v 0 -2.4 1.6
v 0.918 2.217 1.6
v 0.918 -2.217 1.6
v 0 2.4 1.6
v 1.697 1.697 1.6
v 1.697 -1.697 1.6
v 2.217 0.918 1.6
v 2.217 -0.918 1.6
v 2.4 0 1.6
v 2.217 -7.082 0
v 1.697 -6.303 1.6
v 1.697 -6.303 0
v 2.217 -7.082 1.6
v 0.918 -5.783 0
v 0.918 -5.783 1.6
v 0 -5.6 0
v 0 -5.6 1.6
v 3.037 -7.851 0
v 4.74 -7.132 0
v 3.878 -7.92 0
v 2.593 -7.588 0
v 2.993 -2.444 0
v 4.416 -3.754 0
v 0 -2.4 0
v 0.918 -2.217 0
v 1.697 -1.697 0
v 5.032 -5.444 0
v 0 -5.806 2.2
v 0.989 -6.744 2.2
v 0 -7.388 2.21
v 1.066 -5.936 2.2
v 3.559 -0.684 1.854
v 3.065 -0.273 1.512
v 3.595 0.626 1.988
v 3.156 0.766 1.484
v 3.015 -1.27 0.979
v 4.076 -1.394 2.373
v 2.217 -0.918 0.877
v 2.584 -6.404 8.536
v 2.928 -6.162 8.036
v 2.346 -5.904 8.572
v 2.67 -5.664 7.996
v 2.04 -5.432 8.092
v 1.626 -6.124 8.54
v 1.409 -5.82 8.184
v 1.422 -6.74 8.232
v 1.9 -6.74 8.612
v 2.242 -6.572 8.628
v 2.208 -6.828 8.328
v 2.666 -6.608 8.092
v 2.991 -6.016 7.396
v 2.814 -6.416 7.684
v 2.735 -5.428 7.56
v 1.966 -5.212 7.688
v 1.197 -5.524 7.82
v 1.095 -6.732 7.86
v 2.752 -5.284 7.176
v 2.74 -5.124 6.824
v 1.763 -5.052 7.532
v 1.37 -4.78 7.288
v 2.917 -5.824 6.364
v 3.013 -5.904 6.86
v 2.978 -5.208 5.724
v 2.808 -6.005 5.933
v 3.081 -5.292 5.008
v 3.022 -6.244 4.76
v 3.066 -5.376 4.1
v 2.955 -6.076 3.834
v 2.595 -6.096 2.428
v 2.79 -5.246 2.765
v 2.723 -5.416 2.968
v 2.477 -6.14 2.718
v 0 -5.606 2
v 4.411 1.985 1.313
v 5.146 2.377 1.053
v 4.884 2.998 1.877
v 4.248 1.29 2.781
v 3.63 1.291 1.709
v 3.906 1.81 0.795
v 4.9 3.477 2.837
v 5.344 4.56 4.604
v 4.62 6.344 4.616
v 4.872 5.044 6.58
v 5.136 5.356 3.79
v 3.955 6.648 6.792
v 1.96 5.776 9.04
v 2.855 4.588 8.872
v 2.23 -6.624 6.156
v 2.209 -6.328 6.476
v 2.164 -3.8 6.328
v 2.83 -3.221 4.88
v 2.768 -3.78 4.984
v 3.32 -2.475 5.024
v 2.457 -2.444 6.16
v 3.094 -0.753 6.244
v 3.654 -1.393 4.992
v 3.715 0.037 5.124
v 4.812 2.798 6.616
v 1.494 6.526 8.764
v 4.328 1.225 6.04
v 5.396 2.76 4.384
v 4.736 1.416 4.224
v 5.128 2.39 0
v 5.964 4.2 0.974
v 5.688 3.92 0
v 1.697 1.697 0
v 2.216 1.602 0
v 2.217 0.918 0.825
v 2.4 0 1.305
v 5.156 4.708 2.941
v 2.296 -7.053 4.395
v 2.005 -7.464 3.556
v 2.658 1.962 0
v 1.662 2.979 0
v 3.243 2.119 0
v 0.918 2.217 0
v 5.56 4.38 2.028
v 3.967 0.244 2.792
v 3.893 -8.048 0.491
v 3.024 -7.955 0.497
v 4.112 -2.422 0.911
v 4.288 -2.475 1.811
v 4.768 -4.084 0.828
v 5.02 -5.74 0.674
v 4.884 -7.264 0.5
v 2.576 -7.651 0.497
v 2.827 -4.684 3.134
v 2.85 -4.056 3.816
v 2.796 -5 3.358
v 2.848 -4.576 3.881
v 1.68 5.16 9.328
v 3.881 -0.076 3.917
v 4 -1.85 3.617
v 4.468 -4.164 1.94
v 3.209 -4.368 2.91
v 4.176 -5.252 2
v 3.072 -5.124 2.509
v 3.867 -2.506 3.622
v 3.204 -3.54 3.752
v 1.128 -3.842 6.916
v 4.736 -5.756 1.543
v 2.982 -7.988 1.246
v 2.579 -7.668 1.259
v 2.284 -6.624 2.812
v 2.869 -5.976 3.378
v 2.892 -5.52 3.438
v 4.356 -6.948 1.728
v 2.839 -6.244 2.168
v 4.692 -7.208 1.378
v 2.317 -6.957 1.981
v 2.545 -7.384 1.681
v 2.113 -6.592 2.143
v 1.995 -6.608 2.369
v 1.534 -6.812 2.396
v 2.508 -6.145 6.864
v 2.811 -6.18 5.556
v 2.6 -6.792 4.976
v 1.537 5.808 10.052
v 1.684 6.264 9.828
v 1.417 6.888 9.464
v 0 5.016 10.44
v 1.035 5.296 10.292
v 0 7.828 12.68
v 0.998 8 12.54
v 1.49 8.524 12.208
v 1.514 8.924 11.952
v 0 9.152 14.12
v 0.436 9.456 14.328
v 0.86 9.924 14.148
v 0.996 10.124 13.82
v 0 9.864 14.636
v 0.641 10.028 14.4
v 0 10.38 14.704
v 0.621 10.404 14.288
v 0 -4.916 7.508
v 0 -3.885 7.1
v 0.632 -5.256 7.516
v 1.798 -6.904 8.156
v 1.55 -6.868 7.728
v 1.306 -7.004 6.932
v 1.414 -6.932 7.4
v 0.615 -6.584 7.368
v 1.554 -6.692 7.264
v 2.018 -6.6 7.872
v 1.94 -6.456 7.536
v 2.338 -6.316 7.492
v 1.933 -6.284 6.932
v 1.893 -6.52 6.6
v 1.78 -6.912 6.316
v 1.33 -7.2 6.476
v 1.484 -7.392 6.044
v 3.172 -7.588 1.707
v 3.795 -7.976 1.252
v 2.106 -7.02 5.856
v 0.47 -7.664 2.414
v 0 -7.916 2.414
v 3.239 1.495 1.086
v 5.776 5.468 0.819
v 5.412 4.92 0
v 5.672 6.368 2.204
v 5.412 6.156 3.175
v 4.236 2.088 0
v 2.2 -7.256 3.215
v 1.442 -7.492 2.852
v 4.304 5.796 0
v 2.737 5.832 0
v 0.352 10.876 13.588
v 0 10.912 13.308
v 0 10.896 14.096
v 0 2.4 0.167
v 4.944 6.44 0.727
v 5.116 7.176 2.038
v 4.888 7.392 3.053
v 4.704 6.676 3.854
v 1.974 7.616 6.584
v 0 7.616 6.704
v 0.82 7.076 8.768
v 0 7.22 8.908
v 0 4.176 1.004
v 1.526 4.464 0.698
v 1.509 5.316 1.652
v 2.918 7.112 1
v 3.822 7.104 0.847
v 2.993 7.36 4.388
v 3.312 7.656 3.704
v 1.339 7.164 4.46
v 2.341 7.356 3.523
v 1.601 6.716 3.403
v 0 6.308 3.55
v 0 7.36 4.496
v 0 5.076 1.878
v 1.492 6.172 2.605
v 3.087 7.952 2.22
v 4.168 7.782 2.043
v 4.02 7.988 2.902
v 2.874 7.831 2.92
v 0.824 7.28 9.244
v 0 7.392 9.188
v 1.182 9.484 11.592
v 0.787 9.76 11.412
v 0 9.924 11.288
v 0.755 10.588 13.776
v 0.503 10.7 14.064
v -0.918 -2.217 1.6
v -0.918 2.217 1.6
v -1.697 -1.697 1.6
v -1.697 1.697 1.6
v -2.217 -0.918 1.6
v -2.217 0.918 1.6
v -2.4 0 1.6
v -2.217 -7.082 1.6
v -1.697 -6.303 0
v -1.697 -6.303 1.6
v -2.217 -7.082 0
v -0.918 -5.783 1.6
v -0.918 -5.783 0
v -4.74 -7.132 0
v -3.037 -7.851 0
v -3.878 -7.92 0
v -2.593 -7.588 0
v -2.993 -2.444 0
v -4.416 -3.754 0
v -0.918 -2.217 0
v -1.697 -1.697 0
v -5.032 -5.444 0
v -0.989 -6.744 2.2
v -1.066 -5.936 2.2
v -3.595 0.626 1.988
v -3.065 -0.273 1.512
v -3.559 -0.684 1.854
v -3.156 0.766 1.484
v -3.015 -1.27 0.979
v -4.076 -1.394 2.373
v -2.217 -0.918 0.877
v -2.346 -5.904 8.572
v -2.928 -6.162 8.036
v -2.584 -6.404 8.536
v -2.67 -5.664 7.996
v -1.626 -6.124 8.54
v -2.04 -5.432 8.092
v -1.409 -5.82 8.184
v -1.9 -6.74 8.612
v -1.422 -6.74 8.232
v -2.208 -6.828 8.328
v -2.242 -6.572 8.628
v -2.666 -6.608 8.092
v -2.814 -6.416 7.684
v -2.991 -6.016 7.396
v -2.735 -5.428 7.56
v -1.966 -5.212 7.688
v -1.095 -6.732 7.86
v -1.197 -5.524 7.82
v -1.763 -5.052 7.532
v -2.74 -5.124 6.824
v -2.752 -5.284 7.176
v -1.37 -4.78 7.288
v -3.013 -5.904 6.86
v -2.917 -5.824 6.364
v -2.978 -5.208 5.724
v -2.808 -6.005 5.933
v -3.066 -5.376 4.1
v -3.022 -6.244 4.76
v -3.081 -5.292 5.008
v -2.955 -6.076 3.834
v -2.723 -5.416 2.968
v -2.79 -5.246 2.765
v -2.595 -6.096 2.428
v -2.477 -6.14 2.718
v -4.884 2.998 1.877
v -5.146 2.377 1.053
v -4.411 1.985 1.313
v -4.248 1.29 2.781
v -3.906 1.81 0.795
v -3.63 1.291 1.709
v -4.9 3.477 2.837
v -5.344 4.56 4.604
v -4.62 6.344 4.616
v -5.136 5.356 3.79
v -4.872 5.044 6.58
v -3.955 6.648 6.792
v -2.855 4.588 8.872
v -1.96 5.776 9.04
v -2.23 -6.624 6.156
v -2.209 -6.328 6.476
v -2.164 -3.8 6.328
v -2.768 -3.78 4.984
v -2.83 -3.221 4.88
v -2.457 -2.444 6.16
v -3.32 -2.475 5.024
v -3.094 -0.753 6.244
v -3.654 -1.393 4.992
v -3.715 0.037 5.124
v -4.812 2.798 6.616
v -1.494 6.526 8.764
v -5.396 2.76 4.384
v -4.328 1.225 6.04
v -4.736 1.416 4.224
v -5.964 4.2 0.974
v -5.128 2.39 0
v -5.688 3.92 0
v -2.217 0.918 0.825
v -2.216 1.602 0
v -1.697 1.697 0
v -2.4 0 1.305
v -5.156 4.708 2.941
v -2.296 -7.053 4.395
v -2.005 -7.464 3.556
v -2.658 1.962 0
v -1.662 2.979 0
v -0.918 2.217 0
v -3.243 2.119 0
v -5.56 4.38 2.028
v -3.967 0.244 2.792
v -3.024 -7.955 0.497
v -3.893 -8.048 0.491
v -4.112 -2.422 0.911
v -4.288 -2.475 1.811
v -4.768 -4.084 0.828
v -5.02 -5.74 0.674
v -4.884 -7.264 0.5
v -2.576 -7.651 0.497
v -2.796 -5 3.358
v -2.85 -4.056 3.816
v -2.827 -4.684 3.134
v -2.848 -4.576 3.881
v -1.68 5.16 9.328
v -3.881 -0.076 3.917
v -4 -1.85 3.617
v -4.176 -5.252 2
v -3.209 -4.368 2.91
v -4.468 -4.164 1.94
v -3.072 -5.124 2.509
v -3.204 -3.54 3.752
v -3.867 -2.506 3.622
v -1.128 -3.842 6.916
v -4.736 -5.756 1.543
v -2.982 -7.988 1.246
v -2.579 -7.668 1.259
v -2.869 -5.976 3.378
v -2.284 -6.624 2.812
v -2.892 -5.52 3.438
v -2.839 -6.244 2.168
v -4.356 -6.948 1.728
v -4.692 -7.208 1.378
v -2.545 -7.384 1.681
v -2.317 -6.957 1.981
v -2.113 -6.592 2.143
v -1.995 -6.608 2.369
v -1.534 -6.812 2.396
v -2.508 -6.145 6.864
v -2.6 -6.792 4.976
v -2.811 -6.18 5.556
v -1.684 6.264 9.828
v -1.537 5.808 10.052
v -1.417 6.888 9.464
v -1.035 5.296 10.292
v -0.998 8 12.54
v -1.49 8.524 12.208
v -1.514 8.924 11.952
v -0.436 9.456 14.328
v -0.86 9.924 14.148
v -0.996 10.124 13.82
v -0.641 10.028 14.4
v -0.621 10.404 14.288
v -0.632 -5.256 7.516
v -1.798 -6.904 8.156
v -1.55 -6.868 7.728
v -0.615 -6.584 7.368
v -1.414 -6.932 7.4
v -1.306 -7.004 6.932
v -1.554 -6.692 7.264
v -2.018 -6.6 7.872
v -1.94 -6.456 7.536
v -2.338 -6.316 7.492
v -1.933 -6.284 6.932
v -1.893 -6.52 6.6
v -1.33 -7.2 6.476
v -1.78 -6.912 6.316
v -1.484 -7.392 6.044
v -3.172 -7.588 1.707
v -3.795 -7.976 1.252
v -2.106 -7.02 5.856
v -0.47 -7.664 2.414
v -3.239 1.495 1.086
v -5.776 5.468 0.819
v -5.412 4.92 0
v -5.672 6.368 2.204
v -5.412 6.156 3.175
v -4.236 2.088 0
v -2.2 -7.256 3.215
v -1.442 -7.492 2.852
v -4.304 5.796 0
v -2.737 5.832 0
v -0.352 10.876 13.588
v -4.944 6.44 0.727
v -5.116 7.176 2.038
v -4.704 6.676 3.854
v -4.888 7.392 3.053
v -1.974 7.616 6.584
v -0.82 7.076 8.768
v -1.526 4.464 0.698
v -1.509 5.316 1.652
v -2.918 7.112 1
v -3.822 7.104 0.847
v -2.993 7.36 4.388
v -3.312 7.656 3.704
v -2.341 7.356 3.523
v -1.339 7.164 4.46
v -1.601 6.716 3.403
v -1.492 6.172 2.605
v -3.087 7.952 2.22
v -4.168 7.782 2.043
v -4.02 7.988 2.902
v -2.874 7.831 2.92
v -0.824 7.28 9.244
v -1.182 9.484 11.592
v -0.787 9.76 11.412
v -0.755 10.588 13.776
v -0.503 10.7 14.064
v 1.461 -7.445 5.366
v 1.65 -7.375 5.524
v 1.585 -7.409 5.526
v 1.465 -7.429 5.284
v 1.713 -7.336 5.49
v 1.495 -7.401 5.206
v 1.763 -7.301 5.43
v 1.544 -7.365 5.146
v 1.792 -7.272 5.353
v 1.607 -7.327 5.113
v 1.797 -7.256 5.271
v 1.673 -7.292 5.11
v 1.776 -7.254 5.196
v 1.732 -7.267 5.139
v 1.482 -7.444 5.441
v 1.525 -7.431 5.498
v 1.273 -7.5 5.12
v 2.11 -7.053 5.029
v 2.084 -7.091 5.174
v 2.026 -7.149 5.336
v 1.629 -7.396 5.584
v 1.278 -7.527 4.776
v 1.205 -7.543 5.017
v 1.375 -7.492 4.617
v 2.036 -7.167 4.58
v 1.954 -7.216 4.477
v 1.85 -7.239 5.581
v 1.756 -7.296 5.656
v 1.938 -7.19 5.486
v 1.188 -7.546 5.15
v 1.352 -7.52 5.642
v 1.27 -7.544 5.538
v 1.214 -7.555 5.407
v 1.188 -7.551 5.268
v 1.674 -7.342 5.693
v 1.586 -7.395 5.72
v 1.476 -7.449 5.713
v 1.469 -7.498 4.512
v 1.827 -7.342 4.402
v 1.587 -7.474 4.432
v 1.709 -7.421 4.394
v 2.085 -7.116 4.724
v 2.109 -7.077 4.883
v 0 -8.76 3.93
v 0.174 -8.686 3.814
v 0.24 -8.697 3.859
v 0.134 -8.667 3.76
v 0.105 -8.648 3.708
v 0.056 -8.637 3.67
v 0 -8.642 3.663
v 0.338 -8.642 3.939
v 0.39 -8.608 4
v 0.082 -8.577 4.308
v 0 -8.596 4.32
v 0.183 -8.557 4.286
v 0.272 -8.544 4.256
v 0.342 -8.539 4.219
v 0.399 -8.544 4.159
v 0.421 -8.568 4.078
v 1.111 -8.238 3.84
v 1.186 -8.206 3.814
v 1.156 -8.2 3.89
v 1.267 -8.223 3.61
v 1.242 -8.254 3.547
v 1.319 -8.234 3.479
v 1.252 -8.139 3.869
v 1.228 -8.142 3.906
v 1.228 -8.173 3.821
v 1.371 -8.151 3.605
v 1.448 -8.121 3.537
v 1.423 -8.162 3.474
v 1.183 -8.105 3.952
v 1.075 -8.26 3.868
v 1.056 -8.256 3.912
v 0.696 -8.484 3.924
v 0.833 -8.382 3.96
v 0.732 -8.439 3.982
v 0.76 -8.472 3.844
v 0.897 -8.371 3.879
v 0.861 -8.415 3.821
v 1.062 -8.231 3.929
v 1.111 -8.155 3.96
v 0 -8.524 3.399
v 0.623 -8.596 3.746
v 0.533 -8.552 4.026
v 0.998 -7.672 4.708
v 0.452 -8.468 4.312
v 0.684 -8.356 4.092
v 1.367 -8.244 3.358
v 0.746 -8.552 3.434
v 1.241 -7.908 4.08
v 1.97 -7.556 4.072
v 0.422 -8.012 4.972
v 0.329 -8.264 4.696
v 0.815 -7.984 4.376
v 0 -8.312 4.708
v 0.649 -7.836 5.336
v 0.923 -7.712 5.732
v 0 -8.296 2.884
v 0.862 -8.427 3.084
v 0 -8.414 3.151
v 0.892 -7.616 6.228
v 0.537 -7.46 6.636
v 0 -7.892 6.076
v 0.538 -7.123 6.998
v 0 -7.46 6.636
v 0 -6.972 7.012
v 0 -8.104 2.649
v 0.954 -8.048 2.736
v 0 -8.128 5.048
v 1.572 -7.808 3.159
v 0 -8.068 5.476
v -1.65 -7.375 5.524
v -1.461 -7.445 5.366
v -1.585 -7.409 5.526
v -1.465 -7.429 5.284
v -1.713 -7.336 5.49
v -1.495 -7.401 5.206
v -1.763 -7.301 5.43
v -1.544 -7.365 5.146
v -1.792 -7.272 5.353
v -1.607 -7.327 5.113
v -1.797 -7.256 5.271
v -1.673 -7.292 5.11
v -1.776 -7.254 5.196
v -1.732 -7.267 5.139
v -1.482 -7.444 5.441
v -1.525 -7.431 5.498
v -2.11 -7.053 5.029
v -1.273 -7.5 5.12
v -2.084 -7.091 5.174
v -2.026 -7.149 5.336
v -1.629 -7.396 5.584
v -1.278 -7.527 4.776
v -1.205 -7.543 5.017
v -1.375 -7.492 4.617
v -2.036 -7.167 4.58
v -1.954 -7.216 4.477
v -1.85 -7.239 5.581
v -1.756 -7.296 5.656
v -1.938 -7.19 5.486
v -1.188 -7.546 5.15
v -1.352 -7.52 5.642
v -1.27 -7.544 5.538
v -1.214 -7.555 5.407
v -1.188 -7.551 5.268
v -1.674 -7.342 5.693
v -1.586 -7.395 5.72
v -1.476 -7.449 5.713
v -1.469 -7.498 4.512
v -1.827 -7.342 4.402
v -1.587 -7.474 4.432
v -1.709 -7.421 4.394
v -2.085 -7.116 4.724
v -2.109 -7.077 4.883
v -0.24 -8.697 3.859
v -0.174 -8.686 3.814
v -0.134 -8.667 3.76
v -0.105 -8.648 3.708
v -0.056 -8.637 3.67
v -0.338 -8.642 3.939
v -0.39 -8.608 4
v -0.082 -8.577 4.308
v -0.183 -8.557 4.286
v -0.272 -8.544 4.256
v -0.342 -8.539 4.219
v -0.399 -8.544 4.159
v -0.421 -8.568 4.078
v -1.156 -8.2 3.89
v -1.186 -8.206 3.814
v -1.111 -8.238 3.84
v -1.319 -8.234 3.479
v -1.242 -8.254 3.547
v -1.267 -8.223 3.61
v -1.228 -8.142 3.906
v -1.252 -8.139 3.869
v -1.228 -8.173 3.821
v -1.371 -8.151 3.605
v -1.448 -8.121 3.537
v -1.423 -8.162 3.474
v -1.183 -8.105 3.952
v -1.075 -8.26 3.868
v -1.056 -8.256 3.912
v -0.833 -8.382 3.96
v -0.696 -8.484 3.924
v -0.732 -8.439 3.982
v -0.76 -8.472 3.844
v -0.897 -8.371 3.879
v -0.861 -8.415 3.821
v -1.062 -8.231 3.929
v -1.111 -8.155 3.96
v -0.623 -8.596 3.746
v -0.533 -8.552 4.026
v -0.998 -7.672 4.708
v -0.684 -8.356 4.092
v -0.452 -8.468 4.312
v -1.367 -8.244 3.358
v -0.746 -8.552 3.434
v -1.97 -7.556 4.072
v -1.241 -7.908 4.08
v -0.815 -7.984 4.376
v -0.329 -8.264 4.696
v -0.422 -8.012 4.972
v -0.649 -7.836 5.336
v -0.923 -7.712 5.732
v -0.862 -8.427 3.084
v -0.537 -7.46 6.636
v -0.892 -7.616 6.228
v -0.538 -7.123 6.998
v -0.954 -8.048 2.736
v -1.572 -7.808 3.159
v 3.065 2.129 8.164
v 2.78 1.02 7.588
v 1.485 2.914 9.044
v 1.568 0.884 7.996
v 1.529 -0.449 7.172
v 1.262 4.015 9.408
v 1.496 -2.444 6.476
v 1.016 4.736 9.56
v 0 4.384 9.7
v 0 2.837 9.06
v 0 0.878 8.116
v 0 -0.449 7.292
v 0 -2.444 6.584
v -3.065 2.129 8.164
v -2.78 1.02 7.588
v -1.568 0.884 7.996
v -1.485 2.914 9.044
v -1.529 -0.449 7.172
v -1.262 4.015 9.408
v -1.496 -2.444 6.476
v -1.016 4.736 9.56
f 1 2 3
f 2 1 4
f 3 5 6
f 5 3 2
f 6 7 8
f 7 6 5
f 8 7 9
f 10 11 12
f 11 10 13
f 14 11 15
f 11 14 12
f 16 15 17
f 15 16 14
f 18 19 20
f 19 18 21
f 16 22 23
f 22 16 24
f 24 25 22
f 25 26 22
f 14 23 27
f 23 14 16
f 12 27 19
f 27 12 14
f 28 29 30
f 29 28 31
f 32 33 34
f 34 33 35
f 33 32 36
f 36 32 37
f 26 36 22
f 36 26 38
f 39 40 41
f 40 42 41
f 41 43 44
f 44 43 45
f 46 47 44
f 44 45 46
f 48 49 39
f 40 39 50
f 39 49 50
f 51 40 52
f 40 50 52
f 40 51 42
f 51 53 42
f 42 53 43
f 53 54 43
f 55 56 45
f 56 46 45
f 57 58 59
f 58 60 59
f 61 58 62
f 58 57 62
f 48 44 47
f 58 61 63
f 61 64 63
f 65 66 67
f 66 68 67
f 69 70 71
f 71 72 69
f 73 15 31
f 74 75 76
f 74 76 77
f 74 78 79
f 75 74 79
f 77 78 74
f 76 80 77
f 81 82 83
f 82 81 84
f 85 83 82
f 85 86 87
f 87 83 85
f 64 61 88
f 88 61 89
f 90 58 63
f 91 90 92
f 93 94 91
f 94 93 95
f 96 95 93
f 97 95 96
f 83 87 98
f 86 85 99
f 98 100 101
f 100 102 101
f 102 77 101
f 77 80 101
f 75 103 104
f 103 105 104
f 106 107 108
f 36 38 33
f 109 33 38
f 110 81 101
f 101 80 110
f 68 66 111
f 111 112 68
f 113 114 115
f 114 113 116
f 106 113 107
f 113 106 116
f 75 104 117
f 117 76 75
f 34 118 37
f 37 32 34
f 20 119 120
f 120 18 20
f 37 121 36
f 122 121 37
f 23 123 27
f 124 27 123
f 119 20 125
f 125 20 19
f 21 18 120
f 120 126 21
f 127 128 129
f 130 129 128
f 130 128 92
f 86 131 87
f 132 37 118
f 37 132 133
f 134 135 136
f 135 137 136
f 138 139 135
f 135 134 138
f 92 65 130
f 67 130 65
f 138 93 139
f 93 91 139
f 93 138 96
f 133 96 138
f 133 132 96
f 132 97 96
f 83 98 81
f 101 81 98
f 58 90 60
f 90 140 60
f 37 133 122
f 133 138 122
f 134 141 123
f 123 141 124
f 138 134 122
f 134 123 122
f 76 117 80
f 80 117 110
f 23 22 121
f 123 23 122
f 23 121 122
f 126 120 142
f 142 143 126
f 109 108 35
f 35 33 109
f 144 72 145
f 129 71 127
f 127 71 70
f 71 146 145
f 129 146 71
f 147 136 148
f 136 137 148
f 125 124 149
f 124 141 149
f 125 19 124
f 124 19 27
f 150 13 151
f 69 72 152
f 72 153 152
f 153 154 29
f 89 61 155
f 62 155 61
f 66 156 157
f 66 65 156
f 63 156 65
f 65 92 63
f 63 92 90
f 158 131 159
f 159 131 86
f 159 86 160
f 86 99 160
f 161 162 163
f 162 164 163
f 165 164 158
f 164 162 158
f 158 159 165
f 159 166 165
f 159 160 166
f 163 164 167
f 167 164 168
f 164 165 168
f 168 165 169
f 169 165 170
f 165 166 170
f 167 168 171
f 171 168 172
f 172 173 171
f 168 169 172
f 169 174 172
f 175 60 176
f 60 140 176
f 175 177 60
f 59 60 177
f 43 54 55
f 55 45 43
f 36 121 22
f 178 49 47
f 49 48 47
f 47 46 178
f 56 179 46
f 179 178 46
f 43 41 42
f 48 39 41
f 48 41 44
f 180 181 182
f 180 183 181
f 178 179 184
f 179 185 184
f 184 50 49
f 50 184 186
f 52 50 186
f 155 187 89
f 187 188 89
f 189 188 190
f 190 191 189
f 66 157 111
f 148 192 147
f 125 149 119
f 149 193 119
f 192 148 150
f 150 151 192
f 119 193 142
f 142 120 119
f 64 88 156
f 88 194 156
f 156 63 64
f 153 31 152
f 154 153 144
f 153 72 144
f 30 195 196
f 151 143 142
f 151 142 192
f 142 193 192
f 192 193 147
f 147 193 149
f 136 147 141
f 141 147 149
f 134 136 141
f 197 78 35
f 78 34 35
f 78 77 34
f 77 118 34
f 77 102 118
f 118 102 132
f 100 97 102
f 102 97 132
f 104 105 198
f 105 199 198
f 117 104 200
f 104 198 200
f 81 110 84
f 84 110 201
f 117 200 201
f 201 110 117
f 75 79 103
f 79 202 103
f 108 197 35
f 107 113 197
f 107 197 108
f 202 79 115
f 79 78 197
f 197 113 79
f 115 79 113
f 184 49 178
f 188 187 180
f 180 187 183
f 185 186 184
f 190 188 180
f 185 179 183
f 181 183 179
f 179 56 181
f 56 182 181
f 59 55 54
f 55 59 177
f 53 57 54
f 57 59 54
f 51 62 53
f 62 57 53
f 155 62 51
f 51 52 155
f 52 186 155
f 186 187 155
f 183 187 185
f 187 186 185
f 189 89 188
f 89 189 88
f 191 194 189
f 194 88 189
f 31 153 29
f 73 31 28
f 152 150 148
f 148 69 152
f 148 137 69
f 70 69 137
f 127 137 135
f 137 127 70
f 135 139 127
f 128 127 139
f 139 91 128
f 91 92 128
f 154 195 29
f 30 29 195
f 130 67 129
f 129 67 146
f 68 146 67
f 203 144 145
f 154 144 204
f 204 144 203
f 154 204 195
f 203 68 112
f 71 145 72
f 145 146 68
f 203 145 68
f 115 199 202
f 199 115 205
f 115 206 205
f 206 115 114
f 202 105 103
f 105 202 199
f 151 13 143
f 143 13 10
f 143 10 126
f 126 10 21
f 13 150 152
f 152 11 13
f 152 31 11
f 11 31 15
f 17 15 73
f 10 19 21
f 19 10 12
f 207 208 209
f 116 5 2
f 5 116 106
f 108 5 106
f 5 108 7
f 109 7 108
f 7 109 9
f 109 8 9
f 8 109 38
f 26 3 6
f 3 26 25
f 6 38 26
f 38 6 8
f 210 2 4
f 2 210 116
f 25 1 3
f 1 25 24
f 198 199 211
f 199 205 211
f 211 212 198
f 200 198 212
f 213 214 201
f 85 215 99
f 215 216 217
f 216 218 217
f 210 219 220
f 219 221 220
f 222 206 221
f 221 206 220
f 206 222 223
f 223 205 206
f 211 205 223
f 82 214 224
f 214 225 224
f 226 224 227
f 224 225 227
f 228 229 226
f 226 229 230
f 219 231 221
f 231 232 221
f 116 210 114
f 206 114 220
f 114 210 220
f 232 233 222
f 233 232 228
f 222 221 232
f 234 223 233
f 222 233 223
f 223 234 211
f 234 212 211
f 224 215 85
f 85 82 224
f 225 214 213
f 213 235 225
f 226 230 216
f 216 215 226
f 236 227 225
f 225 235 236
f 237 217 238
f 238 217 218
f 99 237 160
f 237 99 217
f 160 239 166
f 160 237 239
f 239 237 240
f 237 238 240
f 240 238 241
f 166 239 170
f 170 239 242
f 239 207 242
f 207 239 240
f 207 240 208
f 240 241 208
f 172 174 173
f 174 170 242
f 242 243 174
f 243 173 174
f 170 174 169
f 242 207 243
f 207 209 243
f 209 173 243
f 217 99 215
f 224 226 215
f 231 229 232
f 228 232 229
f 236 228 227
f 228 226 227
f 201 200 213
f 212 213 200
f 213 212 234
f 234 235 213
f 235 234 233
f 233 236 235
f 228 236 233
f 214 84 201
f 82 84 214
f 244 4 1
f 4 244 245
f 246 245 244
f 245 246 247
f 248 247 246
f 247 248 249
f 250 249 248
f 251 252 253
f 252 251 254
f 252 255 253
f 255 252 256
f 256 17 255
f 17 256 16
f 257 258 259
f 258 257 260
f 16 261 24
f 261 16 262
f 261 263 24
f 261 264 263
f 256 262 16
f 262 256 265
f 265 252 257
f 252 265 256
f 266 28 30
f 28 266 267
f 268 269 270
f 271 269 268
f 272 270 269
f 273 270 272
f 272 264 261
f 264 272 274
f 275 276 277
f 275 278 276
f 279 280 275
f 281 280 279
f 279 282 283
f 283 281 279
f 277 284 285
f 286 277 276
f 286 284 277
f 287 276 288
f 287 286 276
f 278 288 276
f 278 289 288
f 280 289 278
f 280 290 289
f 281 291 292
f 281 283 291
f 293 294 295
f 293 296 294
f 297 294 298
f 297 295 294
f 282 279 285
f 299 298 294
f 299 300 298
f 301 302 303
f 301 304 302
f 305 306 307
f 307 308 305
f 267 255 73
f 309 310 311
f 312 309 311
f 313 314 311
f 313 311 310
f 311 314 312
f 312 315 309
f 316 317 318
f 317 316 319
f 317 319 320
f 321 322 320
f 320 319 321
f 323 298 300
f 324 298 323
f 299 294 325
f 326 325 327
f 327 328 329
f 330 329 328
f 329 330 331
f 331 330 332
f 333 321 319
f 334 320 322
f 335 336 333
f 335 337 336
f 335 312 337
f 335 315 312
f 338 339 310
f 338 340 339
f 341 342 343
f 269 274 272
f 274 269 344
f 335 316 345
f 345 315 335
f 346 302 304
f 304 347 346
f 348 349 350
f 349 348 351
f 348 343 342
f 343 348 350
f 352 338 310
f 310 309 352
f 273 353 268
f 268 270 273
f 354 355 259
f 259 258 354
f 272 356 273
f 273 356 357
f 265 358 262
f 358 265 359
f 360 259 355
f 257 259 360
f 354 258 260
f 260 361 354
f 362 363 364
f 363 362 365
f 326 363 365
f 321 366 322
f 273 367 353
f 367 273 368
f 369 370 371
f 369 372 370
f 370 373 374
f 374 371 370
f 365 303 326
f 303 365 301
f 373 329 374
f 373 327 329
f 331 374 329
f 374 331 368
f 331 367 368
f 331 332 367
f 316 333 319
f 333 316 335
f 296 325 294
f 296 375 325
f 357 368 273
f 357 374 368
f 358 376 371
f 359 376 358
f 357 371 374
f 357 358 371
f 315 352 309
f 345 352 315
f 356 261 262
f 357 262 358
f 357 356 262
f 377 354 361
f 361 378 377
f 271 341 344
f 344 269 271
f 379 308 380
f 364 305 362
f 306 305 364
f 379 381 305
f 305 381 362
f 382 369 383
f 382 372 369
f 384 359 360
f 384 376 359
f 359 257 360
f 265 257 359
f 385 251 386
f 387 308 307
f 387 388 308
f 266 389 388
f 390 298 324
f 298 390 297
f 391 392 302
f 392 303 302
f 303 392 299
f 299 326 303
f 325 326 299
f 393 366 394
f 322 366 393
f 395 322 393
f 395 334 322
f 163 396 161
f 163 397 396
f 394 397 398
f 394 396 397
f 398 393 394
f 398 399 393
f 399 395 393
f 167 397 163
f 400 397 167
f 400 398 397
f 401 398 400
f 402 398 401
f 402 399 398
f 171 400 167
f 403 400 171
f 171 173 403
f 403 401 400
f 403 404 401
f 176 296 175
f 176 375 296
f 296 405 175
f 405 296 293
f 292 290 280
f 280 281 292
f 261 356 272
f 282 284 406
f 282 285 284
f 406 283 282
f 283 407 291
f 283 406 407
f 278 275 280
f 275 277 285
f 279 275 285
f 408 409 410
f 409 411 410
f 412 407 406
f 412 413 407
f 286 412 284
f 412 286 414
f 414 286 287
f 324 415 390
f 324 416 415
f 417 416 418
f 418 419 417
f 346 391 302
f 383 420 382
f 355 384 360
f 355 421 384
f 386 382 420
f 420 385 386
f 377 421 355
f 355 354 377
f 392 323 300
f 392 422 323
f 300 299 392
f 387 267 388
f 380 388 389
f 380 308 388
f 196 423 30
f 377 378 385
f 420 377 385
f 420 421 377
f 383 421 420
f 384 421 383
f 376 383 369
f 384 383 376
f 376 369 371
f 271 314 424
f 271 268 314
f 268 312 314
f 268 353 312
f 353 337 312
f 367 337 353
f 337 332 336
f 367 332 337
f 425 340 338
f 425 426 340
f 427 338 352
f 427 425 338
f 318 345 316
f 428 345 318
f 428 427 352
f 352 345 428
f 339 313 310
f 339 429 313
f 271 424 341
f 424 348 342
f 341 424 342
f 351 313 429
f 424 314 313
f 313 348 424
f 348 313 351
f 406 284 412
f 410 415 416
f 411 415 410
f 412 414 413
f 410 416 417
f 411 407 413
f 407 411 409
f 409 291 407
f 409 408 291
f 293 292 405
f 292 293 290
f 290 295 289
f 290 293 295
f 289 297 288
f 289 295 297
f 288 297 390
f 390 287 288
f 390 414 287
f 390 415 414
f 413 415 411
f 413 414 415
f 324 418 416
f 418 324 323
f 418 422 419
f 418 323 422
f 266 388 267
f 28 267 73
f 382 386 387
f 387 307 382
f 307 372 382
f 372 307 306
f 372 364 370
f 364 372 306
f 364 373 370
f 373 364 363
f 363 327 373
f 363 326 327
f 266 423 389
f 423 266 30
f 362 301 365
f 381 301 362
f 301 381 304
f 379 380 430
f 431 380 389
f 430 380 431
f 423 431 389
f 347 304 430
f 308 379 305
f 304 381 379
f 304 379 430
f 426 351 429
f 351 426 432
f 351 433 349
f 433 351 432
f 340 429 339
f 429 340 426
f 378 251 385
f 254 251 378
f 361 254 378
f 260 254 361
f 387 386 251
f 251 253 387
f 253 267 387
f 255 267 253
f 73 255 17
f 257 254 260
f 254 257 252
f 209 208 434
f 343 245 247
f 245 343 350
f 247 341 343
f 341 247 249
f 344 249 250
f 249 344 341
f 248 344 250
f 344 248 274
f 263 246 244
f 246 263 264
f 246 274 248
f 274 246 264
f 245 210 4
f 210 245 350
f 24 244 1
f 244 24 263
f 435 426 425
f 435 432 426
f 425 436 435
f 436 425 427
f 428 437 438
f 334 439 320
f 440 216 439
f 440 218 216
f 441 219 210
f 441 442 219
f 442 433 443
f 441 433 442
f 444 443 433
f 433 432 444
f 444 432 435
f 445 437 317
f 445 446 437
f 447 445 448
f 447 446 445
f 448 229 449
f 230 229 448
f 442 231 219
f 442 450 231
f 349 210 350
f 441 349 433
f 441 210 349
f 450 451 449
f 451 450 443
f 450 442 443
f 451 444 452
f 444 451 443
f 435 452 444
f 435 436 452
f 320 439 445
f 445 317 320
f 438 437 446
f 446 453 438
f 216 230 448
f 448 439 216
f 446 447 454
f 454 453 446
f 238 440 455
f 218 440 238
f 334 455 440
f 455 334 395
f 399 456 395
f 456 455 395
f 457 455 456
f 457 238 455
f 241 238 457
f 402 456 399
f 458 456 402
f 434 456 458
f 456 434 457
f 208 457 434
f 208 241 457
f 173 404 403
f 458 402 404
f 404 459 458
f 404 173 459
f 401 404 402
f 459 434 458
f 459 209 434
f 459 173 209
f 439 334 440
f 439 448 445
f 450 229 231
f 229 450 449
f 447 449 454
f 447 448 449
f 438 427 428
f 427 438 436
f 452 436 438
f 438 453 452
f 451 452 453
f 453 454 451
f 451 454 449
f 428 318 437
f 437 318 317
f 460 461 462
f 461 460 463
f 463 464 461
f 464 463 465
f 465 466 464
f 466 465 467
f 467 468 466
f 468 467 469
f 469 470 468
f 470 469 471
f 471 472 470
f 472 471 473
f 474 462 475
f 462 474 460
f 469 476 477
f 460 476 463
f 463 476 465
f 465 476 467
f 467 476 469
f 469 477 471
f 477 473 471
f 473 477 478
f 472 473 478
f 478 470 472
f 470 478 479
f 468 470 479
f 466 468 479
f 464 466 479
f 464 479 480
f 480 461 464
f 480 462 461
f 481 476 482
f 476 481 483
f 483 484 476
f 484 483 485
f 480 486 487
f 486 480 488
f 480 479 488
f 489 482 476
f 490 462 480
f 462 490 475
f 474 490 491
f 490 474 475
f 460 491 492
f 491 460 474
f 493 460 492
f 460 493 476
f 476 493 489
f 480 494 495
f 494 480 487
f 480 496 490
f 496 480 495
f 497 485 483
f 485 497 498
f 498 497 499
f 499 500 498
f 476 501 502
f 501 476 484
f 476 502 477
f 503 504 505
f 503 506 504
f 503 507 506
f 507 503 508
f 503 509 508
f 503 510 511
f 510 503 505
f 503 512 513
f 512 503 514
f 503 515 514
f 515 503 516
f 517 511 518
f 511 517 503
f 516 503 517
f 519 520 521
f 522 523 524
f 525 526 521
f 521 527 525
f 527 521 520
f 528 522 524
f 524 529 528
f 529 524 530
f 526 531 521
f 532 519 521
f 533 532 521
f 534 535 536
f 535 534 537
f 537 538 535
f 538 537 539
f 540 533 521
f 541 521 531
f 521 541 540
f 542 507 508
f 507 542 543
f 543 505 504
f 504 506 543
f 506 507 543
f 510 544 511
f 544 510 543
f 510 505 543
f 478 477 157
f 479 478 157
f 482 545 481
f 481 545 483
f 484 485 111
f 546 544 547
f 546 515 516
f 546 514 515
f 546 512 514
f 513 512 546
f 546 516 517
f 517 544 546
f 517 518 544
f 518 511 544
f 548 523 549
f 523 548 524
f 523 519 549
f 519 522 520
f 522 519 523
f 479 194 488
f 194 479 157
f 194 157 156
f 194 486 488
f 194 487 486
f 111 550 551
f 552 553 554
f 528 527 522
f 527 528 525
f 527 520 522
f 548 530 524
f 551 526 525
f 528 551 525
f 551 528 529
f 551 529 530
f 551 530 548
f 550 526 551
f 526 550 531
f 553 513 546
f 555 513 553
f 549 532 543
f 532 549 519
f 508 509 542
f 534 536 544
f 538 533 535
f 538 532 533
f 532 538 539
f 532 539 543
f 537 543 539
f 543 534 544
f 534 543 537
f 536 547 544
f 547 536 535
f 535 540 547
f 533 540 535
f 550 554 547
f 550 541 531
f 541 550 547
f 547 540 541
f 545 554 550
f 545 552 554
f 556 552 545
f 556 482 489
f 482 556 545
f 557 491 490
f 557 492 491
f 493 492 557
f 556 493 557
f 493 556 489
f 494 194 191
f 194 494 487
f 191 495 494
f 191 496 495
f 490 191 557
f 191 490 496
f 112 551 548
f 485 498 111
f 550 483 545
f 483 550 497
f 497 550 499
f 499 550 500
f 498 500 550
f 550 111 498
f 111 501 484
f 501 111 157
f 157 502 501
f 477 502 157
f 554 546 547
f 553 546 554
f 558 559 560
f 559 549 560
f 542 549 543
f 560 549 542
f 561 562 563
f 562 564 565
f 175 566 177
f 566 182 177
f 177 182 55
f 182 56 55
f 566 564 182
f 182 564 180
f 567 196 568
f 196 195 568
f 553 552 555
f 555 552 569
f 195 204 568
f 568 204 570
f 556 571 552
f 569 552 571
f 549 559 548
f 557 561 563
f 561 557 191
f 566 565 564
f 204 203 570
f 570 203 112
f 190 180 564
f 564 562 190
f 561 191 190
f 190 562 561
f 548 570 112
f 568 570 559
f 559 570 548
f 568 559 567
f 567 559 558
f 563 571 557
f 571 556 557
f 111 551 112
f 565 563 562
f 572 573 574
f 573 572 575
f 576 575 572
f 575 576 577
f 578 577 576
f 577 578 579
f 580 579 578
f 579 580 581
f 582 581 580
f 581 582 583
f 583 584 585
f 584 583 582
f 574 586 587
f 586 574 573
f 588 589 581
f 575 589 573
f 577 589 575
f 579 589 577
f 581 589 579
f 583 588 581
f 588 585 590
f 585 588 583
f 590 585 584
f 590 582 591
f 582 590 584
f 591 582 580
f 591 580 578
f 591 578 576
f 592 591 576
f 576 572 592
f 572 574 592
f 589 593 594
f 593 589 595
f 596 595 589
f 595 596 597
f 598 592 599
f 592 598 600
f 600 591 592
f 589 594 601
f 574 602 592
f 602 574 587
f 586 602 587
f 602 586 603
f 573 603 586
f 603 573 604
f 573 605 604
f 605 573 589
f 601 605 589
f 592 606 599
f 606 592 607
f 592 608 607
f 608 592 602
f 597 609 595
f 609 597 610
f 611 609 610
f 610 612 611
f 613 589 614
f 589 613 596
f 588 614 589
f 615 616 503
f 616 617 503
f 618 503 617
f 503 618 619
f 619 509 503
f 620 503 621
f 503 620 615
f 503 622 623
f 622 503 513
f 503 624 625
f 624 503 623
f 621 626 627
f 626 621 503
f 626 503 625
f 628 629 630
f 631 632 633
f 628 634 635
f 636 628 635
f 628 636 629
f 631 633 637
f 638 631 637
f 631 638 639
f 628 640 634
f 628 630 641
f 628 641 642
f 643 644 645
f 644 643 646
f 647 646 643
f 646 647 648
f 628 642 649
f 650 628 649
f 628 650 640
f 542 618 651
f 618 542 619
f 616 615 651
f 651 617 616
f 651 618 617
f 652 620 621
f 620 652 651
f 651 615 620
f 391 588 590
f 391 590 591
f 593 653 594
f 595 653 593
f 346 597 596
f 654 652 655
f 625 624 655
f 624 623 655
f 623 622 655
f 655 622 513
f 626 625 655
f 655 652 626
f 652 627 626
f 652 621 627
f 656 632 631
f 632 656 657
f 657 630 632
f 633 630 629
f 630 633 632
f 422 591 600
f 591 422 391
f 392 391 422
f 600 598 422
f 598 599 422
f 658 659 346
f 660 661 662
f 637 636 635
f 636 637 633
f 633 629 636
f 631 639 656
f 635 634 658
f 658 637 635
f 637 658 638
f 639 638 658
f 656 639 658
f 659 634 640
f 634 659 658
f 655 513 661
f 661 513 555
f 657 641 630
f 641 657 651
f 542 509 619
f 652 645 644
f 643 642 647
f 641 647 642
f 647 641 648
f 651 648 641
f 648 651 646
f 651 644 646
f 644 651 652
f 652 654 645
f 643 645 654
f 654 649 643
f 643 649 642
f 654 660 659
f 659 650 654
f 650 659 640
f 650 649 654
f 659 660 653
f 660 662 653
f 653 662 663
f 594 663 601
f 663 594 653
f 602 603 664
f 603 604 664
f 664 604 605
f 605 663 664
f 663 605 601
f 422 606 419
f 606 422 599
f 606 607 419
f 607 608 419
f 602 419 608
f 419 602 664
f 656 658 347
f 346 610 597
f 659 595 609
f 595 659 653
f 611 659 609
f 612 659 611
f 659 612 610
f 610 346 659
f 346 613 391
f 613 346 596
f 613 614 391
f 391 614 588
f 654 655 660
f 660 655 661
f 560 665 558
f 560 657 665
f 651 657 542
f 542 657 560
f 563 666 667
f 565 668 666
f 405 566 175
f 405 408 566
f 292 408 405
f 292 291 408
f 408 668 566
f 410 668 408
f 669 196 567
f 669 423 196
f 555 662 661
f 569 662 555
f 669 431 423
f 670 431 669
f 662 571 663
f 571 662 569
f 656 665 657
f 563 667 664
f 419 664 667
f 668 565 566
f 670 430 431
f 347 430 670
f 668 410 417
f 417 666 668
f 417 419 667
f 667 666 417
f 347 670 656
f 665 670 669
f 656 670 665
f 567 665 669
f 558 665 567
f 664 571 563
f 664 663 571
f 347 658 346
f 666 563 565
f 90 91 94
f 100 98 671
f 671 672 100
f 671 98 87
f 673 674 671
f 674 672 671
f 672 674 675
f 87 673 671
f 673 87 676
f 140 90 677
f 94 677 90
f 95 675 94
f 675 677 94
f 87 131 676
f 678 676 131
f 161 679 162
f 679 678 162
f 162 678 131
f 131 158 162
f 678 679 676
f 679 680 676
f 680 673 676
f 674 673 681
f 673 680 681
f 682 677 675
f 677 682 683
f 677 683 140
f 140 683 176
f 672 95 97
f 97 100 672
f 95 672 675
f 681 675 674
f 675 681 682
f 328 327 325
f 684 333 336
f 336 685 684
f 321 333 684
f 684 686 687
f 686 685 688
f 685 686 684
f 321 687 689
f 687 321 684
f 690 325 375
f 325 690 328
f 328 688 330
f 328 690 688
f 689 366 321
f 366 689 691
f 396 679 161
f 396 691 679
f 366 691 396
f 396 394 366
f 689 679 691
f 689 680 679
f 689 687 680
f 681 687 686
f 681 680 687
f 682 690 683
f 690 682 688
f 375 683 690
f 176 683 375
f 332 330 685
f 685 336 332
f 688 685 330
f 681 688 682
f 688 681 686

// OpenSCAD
use <../lib.scad>
use <s/6251p04s01.scad>
use <s/6251s01.scad>
use <s/6251s03.scad>
function ldraw_lib__6251p04() = [
// 0 Animal Cat Crouching with Black Eyes, Nose and Whisker Dots Pattern
// 0 Name: 6251p04.dat
// 0 Author: Willy Tschager [Holly-Wood]
// 0 !LDRAW_ORG Part UPDATE 2022-06
// 0 !LICENSE Licensed under CC BY 4.0 : see CAreadme.txt
// 
// 0 BFC CERTIFY CCW
  [0,"BFC","CERTIFY"],
  [0,"BFC","CCW"],
// 
// 0 !KEYWORDS Bricklink 6251pb04, creature, dacta, educational, mousetrap, pet
// 0 !KEYWORDS Rebrickable 6251pr0001, set 3149, set 5823
// 
// 0 !HISTORY 2022-12-20 [PTadmin] Official Update 2022-06
// 
// 
// 0 // Half without Patternable Area
// 
// 1 16 0 0 0 1 0 0 0 1 0 0 0 1 s\6251s01.dat
  [1,16,0,0,0,1,0,0,0,1,0,0,0,1, ldraw_lib__s__6251s01()],
// 1 16 0 0 0 -1 0 0 0 1 0 0 0 1 s\6251s01.dat
  [1,16,0,0,0,-1,0,0,0,1,0,0,0,1, ldraw_lib__s__6251s01()],
// 
// 0 // Patternable Area
// 1 16 0 0 0 1 0 0 0 1 0 0 0 1 s\6251p04s01.dat
  [1,16,0,0,0,1,0,0,0,1,0,0,0,1, ldraw_lib__s__6251p04s01()],
// 1 16 0 0 0 -1 0 0 0 1 0 0 0 1 s\6251p04s01.dat
  [1,16,0,0,0,-1,0,0,0,1,0,0,0,1, ldraw_lib__s__6251p04s01()],
// 
// 0 // Patternable Area Back
// 1 16 0 0 0 1 0 0 0 1 0 0 0 1 s\6251s03.dat
  [1,16,0,0,0,1,0,0,0,1,0,0,0,1, ldraw_lib__s__6251s03()],
// 1 16 0 0 0 -1 0 0 0 1 0 0 0 1 s\6251s03.dat
  [1,16,0,0,0,-1,0,0,0,1,0,0,0,1, ldraw_lib__s__6251s03()],
];
module ldraw_lib__6251p04(step=0, col=false, unit=2/5, alt=false, line=0.2, solid=!$preview)
    makepoly(ldraw_lib__6251p04(), step=step, col=col, unit=unit, alt=alt, line=line, solid=solid);
ldraw_lib__6251p04(line=0.2);
